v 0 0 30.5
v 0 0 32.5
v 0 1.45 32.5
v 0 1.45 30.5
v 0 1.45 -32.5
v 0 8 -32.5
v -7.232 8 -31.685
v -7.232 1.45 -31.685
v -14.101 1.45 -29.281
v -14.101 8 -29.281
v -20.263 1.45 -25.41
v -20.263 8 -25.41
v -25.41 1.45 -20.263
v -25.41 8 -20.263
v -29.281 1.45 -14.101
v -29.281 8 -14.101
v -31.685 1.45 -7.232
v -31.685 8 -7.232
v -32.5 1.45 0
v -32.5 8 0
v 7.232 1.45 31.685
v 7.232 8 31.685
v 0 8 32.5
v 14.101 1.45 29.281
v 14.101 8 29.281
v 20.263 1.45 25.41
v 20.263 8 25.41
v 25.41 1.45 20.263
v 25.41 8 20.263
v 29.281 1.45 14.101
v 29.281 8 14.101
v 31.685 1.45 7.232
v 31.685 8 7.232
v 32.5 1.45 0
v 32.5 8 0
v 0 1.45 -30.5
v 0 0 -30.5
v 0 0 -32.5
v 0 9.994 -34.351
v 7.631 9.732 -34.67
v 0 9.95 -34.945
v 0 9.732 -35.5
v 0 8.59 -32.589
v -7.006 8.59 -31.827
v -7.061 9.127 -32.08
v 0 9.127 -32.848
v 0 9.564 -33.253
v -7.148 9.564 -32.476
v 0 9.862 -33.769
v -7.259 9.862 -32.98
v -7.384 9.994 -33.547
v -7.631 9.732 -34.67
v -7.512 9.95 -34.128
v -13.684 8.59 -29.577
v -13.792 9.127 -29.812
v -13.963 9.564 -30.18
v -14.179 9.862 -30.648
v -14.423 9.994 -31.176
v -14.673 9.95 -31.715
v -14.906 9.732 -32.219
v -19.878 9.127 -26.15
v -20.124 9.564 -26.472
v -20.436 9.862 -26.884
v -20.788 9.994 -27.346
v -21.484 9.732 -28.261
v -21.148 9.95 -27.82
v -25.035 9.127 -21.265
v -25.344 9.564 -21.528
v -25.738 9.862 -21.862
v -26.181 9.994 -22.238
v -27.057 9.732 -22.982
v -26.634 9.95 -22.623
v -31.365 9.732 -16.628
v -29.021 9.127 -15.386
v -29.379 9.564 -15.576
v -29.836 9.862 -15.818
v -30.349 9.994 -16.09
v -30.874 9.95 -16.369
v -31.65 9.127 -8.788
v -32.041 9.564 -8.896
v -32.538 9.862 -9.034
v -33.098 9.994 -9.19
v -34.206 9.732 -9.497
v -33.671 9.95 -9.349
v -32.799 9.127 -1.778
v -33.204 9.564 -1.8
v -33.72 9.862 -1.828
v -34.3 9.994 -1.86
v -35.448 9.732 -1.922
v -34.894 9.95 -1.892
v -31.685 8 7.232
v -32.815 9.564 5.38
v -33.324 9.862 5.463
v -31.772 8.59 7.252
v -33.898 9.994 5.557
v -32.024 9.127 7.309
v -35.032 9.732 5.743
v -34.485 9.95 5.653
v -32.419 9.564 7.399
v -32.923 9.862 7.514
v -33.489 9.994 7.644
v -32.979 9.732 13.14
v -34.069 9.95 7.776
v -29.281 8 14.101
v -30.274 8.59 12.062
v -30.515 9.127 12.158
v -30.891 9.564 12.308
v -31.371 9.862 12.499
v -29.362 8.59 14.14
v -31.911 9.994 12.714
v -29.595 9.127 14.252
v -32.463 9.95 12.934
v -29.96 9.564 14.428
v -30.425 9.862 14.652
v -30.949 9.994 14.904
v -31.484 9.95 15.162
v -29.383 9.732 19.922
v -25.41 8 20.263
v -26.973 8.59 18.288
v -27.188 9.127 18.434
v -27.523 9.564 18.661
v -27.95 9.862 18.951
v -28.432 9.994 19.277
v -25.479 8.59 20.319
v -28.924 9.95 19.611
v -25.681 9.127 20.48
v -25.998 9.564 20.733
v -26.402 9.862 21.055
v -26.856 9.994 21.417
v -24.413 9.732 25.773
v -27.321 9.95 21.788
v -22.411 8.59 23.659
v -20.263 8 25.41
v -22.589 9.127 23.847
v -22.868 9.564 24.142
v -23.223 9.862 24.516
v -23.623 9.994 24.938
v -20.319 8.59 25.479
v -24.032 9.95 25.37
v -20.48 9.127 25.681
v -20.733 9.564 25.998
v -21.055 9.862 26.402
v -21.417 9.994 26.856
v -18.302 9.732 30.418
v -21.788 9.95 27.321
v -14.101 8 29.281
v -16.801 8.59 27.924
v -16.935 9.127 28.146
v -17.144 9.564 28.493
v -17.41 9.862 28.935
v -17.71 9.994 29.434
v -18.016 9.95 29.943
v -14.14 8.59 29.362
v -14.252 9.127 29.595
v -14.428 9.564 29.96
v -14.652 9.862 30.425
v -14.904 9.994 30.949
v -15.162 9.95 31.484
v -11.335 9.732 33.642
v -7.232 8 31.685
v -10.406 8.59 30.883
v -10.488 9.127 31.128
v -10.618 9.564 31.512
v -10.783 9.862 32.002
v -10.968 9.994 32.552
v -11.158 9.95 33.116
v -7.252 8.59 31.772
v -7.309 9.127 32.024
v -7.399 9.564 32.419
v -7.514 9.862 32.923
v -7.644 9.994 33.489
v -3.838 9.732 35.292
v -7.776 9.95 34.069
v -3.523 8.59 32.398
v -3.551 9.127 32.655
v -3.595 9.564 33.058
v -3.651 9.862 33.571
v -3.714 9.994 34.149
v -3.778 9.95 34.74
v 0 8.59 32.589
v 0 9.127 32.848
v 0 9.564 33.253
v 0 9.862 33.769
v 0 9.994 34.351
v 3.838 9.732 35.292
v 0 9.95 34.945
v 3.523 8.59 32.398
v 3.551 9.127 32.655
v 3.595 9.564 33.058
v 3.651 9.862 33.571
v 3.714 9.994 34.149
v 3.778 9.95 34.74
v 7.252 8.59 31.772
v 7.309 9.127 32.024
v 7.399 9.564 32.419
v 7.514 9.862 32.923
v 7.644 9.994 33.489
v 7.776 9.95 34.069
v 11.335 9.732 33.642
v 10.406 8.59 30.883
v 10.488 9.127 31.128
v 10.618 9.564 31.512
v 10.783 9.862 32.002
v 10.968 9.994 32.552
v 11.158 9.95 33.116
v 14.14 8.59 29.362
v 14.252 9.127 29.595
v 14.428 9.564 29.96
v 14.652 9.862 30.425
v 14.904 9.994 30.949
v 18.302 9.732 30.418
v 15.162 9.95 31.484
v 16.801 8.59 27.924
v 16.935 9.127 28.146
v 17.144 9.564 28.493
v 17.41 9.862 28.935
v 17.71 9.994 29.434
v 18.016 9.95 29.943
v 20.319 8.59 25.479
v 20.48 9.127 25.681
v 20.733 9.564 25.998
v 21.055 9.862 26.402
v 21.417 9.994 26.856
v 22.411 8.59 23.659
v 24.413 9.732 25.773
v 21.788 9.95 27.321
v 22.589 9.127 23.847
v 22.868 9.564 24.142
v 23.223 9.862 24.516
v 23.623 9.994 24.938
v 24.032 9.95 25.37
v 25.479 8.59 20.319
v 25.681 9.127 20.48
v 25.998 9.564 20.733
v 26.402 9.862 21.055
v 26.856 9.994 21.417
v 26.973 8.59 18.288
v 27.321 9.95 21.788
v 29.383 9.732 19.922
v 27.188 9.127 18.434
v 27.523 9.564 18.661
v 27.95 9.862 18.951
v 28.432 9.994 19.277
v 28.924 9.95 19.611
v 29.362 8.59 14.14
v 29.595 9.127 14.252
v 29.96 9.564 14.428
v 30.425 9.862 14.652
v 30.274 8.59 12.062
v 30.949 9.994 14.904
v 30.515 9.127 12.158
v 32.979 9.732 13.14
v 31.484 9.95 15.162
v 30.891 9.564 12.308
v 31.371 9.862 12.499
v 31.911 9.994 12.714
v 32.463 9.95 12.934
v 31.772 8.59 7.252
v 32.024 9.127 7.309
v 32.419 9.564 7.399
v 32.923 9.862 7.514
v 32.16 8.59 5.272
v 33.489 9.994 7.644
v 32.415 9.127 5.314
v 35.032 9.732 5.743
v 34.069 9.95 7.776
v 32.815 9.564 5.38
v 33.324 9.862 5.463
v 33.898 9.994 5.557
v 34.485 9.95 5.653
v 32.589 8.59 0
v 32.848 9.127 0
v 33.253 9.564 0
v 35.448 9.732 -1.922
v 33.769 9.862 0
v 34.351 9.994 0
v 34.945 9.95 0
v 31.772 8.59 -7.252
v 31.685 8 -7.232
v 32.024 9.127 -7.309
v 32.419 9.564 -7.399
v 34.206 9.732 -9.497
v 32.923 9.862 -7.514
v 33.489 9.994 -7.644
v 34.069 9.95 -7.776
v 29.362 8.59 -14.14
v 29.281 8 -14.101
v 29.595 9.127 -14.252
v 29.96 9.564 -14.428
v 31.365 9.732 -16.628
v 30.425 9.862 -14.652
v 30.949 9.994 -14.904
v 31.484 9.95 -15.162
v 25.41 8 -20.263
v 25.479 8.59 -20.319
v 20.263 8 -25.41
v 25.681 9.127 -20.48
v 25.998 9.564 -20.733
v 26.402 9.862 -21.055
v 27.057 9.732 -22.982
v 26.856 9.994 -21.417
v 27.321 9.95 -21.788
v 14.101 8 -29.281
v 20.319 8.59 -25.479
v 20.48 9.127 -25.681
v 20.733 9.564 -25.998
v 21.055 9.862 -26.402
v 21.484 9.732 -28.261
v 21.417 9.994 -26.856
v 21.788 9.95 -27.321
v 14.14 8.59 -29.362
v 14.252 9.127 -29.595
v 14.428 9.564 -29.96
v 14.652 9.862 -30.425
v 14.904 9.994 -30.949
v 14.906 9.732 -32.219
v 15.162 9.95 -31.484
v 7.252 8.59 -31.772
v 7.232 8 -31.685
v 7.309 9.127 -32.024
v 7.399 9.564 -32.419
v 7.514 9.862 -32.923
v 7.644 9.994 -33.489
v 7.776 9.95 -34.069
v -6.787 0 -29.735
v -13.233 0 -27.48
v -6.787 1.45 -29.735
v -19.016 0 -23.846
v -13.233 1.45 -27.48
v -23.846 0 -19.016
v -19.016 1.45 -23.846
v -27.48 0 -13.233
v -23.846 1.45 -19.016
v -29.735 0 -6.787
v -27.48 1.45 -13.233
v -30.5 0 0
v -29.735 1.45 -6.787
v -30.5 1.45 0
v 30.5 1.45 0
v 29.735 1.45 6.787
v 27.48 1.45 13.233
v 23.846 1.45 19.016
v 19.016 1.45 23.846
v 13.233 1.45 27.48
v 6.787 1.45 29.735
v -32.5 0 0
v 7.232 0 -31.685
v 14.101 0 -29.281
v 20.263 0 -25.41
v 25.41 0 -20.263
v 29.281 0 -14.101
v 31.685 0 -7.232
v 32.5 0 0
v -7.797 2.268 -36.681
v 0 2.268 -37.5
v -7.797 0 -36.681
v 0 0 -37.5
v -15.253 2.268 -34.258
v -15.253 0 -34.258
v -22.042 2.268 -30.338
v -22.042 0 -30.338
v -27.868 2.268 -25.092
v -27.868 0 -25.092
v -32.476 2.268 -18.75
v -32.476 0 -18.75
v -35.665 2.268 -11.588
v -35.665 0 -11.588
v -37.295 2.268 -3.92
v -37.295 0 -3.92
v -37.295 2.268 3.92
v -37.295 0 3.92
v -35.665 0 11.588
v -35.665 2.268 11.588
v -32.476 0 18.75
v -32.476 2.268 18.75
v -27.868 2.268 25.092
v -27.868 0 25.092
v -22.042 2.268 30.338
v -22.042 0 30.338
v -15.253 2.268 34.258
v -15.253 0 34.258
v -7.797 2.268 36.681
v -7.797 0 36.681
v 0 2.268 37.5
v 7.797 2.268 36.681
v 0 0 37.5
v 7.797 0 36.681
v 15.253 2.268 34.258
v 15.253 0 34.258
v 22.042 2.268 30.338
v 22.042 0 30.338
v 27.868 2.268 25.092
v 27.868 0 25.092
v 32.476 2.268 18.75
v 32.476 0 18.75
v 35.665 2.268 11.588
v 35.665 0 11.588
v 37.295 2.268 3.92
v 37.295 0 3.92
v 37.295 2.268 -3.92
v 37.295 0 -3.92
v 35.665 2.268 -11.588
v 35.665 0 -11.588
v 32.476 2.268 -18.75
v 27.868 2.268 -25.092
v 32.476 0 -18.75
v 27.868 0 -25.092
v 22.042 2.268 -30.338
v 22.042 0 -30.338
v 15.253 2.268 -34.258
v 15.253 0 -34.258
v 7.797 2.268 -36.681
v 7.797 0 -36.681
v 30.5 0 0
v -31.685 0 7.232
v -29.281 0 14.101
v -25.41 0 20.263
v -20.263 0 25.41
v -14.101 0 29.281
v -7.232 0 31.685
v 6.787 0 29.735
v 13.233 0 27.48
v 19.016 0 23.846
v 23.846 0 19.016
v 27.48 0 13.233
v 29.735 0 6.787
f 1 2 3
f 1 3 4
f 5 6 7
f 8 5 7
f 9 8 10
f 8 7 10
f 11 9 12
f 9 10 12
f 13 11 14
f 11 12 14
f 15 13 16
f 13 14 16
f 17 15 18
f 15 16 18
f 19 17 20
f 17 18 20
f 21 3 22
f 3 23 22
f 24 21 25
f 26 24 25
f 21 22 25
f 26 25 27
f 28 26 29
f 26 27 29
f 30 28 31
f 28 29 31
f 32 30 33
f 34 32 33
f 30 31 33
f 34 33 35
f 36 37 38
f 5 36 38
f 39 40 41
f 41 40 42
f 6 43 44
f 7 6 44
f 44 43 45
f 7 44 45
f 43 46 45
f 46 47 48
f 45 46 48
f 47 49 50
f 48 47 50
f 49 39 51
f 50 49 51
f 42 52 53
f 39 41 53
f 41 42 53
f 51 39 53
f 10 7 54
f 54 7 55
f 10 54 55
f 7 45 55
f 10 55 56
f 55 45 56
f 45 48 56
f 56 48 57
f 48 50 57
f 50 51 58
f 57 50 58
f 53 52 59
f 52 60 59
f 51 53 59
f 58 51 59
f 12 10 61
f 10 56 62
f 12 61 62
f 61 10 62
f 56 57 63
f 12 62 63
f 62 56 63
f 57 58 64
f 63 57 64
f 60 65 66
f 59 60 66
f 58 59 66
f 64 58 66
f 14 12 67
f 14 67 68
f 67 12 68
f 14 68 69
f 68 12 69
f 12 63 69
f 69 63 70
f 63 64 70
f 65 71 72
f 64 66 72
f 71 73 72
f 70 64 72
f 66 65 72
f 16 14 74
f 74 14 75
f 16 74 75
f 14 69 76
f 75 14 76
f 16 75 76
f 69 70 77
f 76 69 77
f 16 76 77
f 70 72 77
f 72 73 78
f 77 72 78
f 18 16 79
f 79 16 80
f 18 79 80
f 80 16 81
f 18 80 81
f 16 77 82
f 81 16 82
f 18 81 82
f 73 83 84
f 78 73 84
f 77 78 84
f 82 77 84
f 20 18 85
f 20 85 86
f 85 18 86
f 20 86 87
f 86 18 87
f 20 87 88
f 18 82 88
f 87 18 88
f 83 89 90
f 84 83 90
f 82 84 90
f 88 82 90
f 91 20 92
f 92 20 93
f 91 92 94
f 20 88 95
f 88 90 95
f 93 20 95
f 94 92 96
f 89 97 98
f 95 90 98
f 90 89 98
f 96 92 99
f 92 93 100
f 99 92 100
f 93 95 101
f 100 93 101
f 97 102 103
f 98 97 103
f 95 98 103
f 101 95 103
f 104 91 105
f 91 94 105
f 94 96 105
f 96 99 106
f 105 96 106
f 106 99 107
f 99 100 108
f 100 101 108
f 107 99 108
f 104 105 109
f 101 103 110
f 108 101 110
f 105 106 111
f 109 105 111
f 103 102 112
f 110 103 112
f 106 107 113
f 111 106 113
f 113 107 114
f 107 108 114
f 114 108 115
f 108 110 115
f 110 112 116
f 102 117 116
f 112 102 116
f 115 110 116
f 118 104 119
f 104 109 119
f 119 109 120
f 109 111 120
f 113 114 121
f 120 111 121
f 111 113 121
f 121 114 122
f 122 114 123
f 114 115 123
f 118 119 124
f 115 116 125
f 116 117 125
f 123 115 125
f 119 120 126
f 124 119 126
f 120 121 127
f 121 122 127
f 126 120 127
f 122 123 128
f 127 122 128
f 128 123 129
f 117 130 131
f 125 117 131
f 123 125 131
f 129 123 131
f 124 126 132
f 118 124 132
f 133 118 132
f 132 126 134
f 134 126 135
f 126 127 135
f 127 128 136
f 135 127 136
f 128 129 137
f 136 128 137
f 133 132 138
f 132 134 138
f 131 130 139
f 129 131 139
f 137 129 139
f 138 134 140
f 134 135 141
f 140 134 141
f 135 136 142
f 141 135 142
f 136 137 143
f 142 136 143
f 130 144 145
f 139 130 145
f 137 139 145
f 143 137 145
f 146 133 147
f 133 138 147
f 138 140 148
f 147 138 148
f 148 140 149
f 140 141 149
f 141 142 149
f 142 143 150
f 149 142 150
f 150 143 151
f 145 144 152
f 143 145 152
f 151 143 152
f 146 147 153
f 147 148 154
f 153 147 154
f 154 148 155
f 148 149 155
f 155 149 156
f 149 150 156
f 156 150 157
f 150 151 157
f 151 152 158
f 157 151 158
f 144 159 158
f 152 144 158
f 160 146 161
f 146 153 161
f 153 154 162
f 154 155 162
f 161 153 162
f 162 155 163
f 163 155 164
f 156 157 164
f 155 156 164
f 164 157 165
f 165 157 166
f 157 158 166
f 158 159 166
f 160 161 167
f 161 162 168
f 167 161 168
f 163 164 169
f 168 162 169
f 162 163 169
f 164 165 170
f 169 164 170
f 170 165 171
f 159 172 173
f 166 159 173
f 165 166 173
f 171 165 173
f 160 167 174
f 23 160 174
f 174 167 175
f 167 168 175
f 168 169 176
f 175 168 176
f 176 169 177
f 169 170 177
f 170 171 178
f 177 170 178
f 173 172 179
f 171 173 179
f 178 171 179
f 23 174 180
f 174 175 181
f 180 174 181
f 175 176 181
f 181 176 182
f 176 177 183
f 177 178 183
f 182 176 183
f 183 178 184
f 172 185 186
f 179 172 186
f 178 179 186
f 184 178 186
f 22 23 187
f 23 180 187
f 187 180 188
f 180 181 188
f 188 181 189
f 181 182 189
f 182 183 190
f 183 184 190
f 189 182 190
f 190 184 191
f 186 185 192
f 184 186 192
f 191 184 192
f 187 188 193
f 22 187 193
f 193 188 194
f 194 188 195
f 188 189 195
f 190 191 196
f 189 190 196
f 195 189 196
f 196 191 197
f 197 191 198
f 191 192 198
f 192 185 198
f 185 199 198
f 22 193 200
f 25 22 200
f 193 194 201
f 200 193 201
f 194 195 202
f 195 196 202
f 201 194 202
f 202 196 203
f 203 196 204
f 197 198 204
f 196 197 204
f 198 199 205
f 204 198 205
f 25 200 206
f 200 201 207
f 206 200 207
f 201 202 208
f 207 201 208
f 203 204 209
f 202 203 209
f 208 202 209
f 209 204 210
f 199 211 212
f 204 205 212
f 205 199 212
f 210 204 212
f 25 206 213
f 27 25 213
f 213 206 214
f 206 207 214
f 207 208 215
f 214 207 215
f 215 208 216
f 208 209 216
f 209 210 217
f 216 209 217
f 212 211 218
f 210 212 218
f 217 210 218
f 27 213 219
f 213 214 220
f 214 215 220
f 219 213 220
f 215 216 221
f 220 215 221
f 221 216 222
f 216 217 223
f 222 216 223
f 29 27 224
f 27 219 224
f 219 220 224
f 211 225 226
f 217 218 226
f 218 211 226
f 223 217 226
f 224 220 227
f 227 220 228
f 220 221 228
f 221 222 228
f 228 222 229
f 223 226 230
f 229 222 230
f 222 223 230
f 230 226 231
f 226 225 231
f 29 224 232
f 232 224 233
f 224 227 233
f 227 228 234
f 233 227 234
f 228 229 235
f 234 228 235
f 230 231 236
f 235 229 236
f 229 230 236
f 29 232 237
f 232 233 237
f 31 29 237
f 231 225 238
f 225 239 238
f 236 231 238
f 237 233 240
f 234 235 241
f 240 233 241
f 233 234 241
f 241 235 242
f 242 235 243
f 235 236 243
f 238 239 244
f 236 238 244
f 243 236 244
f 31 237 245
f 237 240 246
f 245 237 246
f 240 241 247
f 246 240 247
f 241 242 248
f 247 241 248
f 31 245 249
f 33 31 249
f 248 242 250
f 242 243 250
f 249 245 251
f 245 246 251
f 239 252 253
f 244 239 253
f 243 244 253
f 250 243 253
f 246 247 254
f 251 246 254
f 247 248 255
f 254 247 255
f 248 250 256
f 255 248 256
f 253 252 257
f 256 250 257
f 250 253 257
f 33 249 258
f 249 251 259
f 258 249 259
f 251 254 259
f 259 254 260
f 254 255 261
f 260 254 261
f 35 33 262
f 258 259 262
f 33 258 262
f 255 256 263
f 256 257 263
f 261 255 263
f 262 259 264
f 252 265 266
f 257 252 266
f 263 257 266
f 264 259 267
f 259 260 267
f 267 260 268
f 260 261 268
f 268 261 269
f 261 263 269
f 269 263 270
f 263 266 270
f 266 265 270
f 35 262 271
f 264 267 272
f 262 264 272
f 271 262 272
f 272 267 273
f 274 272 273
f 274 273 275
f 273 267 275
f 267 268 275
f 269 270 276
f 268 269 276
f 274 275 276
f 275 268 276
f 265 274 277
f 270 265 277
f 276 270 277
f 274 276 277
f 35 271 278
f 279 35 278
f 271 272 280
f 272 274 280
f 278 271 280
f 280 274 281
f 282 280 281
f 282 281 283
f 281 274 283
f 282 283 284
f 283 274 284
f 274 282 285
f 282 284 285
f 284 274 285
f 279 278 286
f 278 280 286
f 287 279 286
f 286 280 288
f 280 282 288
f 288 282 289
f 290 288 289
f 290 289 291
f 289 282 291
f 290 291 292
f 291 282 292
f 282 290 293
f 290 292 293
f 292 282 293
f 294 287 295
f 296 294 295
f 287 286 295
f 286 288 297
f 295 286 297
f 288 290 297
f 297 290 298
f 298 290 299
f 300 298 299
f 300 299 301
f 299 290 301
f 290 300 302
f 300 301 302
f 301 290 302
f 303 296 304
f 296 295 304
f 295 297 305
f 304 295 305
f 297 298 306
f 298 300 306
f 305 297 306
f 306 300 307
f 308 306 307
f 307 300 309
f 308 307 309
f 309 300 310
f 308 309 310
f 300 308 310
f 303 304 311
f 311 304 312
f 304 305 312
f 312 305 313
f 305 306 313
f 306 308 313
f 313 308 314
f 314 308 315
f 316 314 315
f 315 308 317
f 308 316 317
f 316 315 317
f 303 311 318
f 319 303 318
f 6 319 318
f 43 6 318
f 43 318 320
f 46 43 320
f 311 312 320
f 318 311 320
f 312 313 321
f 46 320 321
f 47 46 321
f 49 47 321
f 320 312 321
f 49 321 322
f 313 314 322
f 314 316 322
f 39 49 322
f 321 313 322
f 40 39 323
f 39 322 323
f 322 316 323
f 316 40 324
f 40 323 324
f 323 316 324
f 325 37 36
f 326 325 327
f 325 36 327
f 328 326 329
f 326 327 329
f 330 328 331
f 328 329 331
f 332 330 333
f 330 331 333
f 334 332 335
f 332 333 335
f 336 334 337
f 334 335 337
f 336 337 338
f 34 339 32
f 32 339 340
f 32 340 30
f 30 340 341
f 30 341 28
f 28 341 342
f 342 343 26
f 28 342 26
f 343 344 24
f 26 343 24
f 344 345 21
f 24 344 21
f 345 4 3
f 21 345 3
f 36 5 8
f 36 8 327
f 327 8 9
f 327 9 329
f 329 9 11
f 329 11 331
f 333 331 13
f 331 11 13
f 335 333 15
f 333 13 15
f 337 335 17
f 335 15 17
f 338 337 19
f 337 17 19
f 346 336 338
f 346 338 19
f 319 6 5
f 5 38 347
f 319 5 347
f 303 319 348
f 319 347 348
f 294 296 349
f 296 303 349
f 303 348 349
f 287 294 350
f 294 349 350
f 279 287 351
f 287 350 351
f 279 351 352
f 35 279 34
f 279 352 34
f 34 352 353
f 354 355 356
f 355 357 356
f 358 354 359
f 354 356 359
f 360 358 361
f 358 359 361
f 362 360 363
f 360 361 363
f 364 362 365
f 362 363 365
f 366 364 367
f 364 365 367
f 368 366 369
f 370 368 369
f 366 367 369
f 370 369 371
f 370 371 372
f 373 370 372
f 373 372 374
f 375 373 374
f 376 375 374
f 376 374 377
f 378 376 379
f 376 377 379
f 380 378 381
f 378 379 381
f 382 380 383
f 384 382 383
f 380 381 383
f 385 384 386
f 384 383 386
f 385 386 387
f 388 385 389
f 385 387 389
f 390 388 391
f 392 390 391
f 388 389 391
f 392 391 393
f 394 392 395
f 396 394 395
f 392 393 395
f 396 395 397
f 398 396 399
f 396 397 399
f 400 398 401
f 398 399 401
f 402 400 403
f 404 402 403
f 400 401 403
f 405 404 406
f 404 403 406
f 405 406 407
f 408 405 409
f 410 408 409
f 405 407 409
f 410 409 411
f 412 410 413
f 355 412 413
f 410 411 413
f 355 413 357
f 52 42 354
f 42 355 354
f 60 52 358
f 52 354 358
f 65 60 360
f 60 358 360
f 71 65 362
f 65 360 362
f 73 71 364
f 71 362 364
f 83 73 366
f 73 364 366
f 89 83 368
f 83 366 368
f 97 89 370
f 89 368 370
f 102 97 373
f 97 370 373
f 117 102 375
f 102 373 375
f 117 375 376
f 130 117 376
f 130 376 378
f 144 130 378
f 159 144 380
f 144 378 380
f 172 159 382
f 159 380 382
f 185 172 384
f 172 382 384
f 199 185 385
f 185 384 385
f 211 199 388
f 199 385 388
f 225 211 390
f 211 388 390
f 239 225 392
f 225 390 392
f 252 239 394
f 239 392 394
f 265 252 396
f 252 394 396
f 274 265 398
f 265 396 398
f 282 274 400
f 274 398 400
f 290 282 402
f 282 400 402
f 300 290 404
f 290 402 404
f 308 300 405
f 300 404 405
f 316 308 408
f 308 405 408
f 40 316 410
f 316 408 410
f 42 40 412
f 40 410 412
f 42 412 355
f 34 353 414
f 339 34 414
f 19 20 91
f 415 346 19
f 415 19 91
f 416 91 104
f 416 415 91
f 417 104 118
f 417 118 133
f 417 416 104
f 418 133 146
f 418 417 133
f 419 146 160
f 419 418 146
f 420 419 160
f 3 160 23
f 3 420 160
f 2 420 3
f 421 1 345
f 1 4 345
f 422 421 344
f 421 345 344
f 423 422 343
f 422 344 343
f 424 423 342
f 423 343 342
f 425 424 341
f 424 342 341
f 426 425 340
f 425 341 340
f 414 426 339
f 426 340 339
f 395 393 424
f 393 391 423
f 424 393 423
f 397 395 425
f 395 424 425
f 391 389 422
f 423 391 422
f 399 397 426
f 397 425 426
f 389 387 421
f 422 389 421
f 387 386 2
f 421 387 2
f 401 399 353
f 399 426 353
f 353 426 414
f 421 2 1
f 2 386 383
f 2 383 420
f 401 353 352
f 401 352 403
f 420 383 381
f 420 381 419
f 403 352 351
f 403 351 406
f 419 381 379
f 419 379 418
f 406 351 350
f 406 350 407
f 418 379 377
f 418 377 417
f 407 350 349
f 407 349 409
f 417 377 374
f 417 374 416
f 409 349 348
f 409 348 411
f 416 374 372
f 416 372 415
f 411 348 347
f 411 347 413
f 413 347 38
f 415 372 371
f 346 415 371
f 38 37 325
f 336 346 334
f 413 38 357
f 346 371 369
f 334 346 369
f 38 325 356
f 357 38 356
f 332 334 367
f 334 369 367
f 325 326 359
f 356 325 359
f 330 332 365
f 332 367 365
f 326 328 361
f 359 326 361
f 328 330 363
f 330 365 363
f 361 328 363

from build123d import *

# Parameters (mm, degrees)
CUT_EXTRUDE2_DEPTH = 11.0000001


with BuildPart() as part:
    # Sketch1 → Revolve1 (revolve)
    with BuildSketch(Plane.XY, mode=Mode.PRIVATE) as revolve1_sk:
        with BuildLine():
            Line((37.5, 0), (30.5, 0))
            Line((30.5, 0), (30.5, 1.45))
            Line((30.5, 1.45), (32.5, 1.45))
            Line((32.5, 1.45), (32.5, 8))
            ThreePointArc((32.5, 8), (33.5, 9.732050808), (35.5, 9.732050808))
            Line((35.5, 9.732050808), (37.5, 2.267949192))
            Line((37.5, 2.267949192), (37.5, 0))
        make_face()
    revolve(revolve1_sk.sketch.rotate(Axis((0, 0, 0), (0, 1, 0)), 90), axis=Axis((0, 0, 0), (0, 1, 0)))  # turned: the seam where the file's is

    # Sketch2 → Cut-Extrude2 (cut, through all)
    with BuildSketch(Plane(origin=(0, 0, 0), x_dir=(1, 0, 0), z_dir=(0, 1, 0))):
        with BuildLine():
            Line((0, 30.5), (0, 32.5))
            ThreePointArc((0, 32.5), (22.980970389, 22.980970389), (32.5, 0))
            Line((32.5, 0), (30.5, 0))
            ThreePointArc((30.5, 0), (21.566756826, 21.566756826), (0, 30.5))
        make_face()
        with BuildLine():
            Line((0, -32.5), (0, -30.5))
            ThreePointArc((0, -30.5), (-21.566756826, -21.566756826), (-30.5, 0))
            Line((-30.5, 0), (-32.5, 0))
            ThreePointArc((-32.5, 0), (-22.980970389, -22.980970389), (0, -32.5))
        make_face()
    extrude(amount=CUT_EXTRUDE2_DEPTH, mode=Mode.SUBTRACT)


solid = part.part
